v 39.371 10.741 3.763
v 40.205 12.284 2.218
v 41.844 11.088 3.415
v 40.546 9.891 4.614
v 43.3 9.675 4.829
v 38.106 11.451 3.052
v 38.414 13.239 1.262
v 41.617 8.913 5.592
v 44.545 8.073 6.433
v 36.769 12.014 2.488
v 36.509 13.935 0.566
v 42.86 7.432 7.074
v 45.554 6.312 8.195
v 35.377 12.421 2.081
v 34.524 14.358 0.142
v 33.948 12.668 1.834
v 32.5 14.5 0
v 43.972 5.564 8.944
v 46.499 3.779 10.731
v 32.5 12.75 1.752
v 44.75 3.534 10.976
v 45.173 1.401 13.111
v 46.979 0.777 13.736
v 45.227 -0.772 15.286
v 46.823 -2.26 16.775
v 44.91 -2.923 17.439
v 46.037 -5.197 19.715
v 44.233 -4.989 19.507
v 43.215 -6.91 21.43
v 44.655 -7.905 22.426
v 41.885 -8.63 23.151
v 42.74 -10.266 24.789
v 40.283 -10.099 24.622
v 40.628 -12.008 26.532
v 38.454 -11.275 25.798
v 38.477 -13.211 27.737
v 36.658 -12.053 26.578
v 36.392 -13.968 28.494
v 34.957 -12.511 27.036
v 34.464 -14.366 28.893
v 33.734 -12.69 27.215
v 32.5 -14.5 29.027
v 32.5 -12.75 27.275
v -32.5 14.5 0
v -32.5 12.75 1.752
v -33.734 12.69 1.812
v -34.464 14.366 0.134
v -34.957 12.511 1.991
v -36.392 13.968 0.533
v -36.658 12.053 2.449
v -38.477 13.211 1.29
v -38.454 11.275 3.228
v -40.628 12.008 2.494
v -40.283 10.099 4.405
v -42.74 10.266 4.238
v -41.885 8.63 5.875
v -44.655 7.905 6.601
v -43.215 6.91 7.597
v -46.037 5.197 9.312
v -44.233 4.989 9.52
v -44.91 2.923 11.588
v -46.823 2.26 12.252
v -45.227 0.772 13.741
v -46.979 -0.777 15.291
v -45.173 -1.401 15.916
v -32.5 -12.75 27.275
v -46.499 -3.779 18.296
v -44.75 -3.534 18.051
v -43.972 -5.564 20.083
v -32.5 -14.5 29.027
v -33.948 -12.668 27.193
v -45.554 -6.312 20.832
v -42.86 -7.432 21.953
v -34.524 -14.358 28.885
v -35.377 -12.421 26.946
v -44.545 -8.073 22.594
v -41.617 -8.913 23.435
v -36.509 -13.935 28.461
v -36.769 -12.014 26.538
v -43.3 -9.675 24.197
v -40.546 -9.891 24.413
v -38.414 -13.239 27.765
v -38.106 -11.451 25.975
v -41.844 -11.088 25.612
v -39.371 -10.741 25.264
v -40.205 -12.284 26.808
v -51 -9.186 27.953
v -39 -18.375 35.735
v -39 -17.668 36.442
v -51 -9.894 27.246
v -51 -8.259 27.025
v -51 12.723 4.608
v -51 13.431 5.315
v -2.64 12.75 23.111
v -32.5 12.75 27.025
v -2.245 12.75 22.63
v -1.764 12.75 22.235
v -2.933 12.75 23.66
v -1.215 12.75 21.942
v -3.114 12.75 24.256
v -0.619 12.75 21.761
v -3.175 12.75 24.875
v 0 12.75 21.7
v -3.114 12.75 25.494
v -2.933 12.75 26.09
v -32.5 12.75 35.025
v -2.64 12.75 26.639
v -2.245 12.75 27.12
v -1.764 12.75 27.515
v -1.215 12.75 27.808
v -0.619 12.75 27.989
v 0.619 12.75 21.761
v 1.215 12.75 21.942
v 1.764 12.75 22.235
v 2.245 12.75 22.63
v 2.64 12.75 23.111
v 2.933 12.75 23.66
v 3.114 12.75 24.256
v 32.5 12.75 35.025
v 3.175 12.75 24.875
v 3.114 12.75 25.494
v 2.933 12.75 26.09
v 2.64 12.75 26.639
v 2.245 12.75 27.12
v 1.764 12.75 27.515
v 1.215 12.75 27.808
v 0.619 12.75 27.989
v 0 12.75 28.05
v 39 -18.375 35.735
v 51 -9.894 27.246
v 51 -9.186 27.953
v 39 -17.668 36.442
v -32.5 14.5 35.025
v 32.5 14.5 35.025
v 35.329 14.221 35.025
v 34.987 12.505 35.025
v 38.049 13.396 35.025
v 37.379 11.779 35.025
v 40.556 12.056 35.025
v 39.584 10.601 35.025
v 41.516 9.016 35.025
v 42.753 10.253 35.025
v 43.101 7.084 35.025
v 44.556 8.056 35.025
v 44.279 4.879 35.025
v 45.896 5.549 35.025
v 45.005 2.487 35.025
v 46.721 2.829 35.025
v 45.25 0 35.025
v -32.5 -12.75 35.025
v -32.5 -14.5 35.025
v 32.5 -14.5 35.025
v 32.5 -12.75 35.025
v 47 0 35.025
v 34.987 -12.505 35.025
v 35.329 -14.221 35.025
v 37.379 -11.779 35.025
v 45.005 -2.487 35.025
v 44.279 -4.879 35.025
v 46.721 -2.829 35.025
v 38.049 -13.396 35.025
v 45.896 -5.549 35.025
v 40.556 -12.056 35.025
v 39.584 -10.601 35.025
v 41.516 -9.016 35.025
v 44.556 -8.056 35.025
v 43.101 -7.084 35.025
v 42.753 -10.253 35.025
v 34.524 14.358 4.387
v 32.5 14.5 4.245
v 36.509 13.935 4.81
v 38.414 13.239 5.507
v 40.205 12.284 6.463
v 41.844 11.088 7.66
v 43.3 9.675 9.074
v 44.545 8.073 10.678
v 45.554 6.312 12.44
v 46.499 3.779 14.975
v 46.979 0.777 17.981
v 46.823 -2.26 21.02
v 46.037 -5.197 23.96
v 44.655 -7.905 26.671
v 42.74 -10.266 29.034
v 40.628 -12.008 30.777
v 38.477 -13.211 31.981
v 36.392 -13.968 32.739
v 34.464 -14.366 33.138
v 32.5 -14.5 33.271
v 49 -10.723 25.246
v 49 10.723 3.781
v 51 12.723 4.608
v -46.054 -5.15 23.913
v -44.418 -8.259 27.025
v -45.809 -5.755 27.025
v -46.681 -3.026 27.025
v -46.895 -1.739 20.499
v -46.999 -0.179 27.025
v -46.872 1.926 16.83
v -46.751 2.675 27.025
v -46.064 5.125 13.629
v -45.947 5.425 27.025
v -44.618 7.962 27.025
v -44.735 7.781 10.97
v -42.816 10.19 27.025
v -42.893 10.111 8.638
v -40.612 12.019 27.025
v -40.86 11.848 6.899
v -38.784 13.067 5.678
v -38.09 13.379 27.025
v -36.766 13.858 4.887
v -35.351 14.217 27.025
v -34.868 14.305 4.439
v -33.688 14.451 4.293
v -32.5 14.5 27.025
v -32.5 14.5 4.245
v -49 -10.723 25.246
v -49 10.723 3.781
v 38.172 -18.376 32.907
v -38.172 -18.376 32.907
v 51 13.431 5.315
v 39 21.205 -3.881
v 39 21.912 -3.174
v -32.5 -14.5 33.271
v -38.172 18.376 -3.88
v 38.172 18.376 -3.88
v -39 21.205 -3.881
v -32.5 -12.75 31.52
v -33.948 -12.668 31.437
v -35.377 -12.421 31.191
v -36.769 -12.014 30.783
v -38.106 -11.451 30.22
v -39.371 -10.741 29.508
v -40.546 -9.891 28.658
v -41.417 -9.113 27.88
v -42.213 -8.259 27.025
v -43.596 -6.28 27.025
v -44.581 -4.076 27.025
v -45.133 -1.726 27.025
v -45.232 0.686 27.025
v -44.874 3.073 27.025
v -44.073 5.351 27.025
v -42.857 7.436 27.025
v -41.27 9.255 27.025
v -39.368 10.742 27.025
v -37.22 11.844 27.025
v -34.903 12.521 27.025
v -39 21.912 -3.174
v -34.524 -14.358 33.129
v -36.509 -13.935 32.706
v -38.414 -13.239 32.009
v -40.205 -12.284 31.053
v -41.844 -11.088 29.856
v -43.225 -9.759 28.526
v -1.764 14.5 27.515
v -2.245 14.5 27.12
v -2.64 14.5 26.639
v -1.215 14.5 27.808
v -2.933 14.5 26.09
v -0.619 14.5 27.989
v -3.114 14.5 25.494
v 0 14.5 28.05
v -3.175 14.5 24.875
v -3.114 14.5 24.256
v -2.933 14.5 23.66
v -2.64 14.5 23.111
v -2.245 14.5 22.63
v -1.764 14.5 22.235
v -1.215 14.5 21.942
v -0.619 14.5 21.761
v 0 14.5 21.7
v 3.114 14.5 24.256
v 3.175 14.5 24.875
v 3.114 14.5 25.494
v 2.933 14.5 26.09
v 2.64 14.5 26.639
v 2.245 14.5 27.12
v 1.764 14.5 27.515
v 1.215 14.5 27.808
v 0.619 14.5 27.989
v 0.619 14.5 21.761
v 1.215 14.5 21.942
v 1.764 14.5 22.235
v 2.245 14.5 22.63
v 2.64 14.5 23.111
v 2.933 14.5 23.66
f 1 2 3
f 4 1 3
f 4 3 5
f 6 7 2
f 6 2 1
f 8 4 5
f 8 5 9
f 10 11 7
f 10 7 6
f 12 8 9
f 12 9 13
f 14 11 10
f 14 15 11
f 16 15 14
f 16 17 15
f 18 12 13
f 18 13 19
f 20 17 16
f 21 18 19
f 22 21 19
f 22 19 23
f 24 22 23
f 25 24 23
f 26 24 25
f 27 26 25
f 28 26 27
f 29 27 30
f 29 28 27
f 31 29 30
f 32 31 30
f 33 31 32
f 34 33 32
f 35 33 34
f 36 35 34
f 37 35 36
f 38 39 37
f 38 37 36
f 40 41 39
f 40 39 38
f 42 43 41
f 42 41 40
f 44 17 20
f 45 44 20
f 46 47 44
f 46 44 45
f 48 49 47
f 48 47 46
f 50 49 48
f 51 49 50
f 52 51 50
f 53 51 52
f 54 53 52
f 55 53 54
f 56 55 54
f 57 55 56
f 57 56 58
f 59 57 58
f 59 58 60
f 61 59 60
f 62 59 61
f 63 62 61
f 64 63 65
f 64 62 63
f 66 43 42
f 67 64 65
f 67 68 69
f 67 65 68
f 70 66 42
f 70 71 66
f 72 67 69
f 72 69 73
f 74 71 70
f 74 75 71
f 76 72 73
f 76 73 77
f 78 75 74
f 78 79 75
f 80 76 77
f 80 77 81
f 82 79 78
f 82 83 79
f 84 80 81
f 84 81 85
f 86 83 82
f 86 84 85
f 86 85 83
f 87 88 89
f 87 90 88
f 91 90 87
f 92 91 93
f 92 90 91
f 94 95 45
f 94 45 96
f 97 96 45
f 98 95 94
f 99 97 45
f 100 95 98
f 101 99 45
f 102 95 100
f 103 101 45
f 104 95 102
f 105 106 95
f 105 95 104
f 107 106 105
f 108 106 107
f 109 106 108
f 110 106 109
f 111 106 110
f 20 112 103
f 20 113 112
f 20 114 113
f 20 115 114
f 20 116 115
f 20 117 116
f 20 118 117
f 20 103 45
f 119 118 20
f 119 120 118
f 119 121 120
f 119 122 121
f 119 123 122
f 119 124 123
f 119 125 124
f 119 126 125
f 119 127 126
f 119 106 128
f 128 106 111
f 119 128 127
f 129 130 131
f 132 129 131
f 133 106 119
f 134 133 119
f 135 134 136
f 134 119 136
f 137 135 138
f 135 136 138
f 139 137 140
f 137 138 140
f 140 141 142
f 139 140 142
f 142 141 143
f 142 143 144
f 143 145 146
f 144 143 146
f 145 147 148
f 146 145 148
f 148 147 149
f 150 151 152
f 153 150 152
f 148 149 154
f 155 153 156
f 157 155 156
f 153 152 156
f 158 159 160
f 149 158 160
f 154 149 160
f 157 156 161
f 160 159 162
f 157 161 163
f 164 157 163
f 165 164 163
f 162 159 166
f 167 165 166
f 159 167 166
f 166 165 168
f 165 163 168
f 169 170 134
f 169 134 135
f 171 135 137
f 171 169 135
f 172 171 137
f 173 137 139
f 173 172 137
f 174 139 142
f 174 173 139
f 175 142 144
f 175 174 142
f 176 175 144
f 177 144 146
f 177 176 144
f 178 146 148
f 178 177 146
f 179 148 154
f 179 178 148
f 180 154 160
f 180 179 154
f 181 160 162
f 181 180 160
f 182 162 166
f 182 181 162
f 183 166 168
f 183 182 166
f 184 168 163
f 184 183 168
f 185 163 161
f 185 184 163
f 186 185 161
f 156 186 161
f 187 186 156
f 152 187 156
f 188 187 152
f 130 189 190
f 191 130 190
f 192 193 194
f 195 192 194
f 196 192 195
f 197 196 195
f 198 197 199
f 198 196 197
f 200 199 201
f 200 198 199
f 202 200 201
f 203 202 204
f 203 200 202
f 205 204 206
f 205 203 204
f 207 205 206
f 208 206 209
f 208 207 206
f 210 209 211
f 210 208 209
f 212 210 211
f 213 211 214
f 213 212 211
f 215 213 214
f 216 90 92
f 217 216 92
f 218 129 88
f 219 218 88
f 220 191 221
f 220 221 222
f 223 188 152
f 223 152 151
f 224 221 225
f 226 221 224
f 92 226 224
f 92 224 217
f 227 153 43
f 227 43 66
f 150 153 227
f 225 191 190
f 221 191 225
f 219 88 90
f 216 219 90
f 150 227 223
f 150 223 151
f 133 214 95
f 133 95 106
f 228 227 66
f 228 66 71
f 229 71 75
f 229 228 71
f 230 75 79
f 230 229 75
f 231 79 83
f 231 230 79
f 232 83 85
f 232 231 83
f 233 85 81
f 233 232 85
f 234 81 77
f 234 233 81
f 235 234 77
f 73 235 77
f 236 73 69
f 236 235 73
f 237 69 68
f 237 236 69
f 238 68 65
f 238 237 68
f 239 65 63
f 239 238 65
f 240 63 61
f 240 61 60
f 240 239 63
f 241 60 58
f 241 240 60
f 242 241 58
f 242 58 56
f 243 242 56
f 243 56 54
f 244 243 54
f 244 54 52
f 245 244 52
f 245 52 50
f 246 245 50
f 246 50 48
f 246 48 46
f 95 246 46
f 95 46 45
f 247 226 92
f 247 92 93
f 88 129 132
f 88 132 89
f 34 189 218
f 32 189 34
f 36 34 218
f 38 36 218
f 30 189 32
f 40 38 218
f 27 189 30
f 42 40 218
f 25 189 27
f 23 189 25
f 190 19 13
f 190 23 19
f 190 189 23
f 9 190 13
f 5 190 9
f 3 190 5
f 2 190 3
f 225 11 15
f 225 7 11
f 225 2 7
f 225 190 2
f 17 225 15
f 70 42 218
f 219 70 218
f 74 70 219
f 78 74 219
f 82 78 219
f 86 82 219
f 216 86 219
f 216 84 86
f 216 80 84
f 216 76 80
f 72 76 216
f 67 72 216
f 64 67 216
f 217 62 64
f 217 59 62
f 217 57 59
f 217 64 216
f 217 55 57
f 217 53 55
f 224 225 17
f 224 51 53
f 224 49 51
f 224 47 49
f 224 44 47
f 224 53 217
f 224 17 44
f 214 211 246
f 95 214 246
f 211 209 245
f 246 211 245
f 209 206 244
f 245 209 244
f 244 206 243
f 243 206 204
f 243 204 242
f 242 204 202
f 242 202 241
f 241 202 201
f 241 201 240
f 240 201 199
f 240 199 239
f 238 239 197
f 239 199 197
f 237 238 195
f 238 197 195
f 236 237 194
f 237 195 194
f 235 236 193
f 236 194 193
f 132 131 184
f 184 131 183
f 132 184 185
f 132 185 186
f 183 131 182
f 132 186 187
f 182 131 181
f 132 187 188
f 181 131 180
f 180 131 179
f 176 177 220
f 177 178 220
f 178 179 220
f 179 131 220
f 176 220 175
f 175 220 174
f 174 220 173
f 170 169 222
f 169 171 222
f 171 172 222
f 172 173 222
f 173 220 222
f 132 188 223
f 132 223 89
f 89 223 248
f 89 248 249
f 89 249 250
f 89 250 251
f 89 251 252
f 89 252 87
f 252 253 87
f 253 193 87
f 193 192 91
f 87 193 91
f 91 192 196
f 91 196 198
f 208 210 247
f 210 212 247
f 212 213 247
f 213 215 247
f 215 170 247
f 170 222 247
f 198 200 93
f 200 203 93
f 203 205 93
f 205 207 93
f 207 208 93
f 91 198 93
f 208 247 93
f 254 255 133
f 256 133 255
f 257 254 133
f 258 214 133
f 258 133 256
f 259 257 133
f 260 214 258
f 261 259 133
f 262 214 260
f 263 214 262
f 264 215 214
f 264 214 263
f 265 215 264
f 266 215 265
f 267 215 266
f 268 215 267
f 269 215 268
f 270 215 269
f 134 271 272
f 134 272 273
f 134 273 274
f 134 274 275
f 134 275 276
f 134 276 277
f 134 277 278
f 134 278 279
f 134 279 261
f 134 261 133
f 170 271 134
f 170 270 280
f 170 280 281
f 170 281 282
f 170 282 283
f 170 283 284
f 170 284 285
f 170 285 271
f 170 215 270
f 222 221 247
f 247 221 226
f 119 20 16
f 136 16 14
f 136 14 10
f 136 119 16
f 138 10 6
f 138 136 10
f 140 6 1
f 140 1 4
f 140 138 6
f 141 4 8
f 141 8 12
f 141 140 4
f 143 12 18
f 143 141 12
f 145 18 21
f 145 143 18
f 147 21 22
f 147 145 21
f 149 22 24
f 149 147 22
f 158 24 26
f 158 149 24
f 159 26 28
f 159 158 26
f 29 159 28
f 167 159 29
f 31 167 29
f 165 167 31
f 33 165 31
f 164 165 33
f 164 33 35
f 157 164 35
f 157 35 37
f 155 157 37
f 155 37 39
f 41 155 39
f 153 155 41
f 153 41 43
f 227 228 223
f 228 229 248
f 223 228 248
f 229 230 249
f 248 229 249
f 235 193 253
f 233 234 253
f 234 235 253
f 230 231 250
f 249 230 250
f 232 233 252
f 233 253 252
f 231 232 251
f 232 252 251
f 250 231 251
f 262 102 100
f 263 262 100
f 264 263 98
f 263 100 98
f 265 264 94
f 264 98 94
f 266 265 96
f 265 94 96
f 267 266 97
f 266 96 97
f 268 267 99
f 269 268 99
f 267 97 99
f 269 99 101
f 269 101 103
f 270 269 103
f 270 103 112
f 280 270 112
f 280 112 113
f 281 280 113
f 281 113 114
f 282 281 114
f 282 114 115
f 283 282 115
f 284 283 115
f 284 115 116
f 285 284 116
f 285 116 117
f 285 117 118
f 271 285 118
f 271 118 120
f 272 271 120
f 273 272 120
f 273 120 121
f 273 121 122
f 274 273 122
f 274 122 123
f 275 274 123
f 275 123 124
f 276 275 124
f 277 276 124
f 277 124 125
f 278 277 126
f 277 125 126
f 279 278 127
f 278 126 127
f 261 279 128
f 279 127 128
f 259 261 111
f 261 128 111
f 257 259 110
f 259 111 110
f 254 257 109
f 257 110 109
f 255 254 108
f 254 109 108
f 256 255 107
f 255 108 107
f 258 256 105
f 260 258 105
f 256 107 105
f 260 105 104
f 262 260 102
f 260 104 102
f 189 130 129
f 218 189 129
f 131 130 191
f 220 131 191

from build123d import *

# Parameters (mm, degrees)
BOSS_EXTRUDE12_DEPTH            = 80
CUT_EXTRUDE10_DEPTH             = 114.712356409
CUT_EXTRUDE10_DEPTH_BACK        = 114.712356409
SKETCH37_W                      = 102
SKETCH37_H                      = 56
BOSS_EXTRUDE16_DEPTH            = 3
CUT_EXTRUDE11_DEPTH             = 102.766059637
SKETCH40_W                      = 127.486838651
SKETCH40_H                      = 54.833163407
CUT_EXTRUDE12_DEPTH             = 102.007241851
CUT_EXTRUDE12_DIRECTION_2_REACH = 103.007
CUT_EXTRUDE14_DEPTH             = 18.5
F_1_4_0_25_DIAMETER_HOLE1_D     = 6.35
F_1_4_0_25_DIAMETER_HOLE1_DEPTH = 5
F_1_4_0_25_DIAMETER_HOLE1_TIP   = 1.907732465
CHAMFER2_SIZE                   = 12
CHAMFER3_SIZE                   = 2


with BuildPart() as part:
    # Sketch22 → Boss-Extrude12 (new body)
    with BuildSketch(Plane.XY):
        with BuildLine():
            Line((32.5, -14.5), (-32.5, -14.5))
            ThreePointArc((-32.5, -14.5), (-47, 0), (-32.5, 14.5))
            Line((-32.5, 14.5), (32.5, 14.5))
            ThreePointArc((32.5, 14.5), (47, 0), (32.5, -14.5))
        make_face()
    extrude(amount=BOSS_EXTRUDE12_DEPTH)

    # Sketch35 → Cut-Extrude10 (cut, two sides: drawn at the far end of the back side and taken through both)
    with BuildSketch(Plane(origin=(-32.5, 0, 0), x_dir=(0, 0, -1), z_dir=(1, 0, 0)).offset(-CUT_EXTRUDE10_DEPTH_BACK)):
        Polygon((0, 14.5), (-29.026860374, -14.5), (0, -14.5), align=None)
    extrude(amount=CUT_EXTRUDE10_DEPTH + CUT_EXTRUDE10_DEPTH_BACK, mode=Mode.SUBTRACT)

    # Sketch37 → Boss-Extrude16 (add)
    with BuildSketch(Plane(origin=(0, 7.256711984, 7.249996893), x_dir=(-1, 0, 0), z_dir=(0, -0.7074340219640284, -0.7067793888957138))):
        with Locations((0, -10.26729429)):
            Rectangle(SKETCH37_W, SKETCH37_H)
    extrude(amount=-BOSS_EXTRUDE16_DEPTH)

    # Sketch38 → Cut-Extrude11 (cut, through all)
    with BuildSketch(Plane.XY.offset(80)):
        with BuildLine():
            Line((-32.5, 12.75), (32.5, 12.75))
            ThreePointArc((32.5, 12.75), (45.25, 0), (32.5, -12.75))
            Line((32.5, -12.75), (-32.5, -12.75))
            ThreePointArc((-32.5, -12.75), (-45.25, 0), (-32.5, 12.75))
        make_face()
    extrude(amount=-CUT_EXTRUDE11_DEPTH, mode=Mode.SUBTRACT)

    # Sketch40 → Cut-Extrude12 (cut)
    with BuildSketch(Plane(origin=(0, -12.75, 0), x_dir=(1, 0, 0), z_dir=(0, 1, 0))):
        with Locations((5.984726224, -62.441589639)):
            Rectangle(SKETCH40_W, SKETCH40_H)
    extrude(amount=CUT_EXTRUDE12_DEPTH, mode=Mode.SUBTRACT)

    # Cut-Extrude12 direction 2: up to this face of the body (flat: up to its plane)
    cut_extrude12_direction_2_end = Plane(part.part.faces().sort_by_distance((0, -14.5, 56.635733163))[0])
    # Sketch40 → Cut-Extrude12 direction 2 (cut, up to the picked face)
    with BuildSketch(Plane(origin=(0, -12.75, 0), x_dir=(1, 0, 0), z_dir=(0, 1, 0)), mode=Mode.PRIVATE) as cut_extrude12_direction_2_sk1:
        with Locations((5.984726224, -62.441589639)):
            Rectangle(SKETCH40_W, SKETCH40_H)
    cut_extrude12_direction_2_tool1 = split(extrude(cut_extrude12_direction_2_sk1.sketch, amount=-CUT_EXTRUDE12_DIRECTION_2_REACH, mode=Mode.PRIVATE), bisect_by=cut_extrude12_direction_2_end, keep=Keep.BOTH, mode=Mode.PRIVATE)
    add(cut_extrude12_direction_2_tool1.solids().sort_by(Axis((5.984726, -12.75, 62.44159), (0, -1, 0)))[0], mode=Mode.SUBTRACT)

    # Sketch42 → Cut-Extrude14 (cut)
    with BuildSketch(Plane.ZY.offset(51)):
        Polygon((35.025007935, 14.5), (27.025007935, 14.5), (27.025007935, -8.259321849), (33.271466325, -14.5), (35.025007935, -14.5), align=None)
    extrude(amount=-CUT_EXTRUDE14_DEPTH, mode=Mode.SUBTRACT)

    # 1/4 (0.25) Diameter Hole1
    with Locations(Plane(origin=(0, 14.5, 0), x_dir=(1, 0, 0), z_dir=(0, 1, 0))):
        with Locations((2.6293e-05, -24.875007935)):
            Hole(F_1_4_0_25_DIAMETER_HOLE1_D / 2, depth=F_1_4_0_25_DIAMETER_HOLE1_DEPTH)
            with Locations((0, 0, -(F_1_4_0_25_DIAMETER_HOLE1_DEPTH + F_1_4_0_25_DIAMETER_HOLE1_TIP / 2))):  # 118° drill point
                Cone(0, F_1_4_0_25_DIAMETER_HOLE1_D / 2, F_1_4_0_25_DIAMETER_HOLE1_TIP, mode=Mode.SUBTRACT)

    # Chamfer2
    chamfer2_edges = [part.edges().sort_by_distance(p)[0] for p in [
        (51, -18.728671856, 35.381751886),
        (51, 20.850973922, -4.234553344),
        (-51, 20.850973922, -4.234553344),
        (-51, -18.728671856, 35.381751886),
    ]]
    chamfer(chamfer2_edges, length=CHAMFER2_SIZE)

    # Chamfer3
    chamfer3_edges = [part.edges().sort_by_distance(p)[0] for p in [
        (-51, 0, 14.513430187),
        (51, 0, 14.513430187),
        (0, -19.789822889, 34.321582802),
        (0, 19.789822889, -5.294722428),
        (-45, -15.549146556, 30.07697867),
        (45, -15.549146556, 30.07697867),
        (45, 15.549146556, -1.050118296),
        (-45, 15.549146556, -1.050118296),
    ]]
    chamfer(chamfer3_edges, length=CHAMFER3_SIZE)


solid = part.part
